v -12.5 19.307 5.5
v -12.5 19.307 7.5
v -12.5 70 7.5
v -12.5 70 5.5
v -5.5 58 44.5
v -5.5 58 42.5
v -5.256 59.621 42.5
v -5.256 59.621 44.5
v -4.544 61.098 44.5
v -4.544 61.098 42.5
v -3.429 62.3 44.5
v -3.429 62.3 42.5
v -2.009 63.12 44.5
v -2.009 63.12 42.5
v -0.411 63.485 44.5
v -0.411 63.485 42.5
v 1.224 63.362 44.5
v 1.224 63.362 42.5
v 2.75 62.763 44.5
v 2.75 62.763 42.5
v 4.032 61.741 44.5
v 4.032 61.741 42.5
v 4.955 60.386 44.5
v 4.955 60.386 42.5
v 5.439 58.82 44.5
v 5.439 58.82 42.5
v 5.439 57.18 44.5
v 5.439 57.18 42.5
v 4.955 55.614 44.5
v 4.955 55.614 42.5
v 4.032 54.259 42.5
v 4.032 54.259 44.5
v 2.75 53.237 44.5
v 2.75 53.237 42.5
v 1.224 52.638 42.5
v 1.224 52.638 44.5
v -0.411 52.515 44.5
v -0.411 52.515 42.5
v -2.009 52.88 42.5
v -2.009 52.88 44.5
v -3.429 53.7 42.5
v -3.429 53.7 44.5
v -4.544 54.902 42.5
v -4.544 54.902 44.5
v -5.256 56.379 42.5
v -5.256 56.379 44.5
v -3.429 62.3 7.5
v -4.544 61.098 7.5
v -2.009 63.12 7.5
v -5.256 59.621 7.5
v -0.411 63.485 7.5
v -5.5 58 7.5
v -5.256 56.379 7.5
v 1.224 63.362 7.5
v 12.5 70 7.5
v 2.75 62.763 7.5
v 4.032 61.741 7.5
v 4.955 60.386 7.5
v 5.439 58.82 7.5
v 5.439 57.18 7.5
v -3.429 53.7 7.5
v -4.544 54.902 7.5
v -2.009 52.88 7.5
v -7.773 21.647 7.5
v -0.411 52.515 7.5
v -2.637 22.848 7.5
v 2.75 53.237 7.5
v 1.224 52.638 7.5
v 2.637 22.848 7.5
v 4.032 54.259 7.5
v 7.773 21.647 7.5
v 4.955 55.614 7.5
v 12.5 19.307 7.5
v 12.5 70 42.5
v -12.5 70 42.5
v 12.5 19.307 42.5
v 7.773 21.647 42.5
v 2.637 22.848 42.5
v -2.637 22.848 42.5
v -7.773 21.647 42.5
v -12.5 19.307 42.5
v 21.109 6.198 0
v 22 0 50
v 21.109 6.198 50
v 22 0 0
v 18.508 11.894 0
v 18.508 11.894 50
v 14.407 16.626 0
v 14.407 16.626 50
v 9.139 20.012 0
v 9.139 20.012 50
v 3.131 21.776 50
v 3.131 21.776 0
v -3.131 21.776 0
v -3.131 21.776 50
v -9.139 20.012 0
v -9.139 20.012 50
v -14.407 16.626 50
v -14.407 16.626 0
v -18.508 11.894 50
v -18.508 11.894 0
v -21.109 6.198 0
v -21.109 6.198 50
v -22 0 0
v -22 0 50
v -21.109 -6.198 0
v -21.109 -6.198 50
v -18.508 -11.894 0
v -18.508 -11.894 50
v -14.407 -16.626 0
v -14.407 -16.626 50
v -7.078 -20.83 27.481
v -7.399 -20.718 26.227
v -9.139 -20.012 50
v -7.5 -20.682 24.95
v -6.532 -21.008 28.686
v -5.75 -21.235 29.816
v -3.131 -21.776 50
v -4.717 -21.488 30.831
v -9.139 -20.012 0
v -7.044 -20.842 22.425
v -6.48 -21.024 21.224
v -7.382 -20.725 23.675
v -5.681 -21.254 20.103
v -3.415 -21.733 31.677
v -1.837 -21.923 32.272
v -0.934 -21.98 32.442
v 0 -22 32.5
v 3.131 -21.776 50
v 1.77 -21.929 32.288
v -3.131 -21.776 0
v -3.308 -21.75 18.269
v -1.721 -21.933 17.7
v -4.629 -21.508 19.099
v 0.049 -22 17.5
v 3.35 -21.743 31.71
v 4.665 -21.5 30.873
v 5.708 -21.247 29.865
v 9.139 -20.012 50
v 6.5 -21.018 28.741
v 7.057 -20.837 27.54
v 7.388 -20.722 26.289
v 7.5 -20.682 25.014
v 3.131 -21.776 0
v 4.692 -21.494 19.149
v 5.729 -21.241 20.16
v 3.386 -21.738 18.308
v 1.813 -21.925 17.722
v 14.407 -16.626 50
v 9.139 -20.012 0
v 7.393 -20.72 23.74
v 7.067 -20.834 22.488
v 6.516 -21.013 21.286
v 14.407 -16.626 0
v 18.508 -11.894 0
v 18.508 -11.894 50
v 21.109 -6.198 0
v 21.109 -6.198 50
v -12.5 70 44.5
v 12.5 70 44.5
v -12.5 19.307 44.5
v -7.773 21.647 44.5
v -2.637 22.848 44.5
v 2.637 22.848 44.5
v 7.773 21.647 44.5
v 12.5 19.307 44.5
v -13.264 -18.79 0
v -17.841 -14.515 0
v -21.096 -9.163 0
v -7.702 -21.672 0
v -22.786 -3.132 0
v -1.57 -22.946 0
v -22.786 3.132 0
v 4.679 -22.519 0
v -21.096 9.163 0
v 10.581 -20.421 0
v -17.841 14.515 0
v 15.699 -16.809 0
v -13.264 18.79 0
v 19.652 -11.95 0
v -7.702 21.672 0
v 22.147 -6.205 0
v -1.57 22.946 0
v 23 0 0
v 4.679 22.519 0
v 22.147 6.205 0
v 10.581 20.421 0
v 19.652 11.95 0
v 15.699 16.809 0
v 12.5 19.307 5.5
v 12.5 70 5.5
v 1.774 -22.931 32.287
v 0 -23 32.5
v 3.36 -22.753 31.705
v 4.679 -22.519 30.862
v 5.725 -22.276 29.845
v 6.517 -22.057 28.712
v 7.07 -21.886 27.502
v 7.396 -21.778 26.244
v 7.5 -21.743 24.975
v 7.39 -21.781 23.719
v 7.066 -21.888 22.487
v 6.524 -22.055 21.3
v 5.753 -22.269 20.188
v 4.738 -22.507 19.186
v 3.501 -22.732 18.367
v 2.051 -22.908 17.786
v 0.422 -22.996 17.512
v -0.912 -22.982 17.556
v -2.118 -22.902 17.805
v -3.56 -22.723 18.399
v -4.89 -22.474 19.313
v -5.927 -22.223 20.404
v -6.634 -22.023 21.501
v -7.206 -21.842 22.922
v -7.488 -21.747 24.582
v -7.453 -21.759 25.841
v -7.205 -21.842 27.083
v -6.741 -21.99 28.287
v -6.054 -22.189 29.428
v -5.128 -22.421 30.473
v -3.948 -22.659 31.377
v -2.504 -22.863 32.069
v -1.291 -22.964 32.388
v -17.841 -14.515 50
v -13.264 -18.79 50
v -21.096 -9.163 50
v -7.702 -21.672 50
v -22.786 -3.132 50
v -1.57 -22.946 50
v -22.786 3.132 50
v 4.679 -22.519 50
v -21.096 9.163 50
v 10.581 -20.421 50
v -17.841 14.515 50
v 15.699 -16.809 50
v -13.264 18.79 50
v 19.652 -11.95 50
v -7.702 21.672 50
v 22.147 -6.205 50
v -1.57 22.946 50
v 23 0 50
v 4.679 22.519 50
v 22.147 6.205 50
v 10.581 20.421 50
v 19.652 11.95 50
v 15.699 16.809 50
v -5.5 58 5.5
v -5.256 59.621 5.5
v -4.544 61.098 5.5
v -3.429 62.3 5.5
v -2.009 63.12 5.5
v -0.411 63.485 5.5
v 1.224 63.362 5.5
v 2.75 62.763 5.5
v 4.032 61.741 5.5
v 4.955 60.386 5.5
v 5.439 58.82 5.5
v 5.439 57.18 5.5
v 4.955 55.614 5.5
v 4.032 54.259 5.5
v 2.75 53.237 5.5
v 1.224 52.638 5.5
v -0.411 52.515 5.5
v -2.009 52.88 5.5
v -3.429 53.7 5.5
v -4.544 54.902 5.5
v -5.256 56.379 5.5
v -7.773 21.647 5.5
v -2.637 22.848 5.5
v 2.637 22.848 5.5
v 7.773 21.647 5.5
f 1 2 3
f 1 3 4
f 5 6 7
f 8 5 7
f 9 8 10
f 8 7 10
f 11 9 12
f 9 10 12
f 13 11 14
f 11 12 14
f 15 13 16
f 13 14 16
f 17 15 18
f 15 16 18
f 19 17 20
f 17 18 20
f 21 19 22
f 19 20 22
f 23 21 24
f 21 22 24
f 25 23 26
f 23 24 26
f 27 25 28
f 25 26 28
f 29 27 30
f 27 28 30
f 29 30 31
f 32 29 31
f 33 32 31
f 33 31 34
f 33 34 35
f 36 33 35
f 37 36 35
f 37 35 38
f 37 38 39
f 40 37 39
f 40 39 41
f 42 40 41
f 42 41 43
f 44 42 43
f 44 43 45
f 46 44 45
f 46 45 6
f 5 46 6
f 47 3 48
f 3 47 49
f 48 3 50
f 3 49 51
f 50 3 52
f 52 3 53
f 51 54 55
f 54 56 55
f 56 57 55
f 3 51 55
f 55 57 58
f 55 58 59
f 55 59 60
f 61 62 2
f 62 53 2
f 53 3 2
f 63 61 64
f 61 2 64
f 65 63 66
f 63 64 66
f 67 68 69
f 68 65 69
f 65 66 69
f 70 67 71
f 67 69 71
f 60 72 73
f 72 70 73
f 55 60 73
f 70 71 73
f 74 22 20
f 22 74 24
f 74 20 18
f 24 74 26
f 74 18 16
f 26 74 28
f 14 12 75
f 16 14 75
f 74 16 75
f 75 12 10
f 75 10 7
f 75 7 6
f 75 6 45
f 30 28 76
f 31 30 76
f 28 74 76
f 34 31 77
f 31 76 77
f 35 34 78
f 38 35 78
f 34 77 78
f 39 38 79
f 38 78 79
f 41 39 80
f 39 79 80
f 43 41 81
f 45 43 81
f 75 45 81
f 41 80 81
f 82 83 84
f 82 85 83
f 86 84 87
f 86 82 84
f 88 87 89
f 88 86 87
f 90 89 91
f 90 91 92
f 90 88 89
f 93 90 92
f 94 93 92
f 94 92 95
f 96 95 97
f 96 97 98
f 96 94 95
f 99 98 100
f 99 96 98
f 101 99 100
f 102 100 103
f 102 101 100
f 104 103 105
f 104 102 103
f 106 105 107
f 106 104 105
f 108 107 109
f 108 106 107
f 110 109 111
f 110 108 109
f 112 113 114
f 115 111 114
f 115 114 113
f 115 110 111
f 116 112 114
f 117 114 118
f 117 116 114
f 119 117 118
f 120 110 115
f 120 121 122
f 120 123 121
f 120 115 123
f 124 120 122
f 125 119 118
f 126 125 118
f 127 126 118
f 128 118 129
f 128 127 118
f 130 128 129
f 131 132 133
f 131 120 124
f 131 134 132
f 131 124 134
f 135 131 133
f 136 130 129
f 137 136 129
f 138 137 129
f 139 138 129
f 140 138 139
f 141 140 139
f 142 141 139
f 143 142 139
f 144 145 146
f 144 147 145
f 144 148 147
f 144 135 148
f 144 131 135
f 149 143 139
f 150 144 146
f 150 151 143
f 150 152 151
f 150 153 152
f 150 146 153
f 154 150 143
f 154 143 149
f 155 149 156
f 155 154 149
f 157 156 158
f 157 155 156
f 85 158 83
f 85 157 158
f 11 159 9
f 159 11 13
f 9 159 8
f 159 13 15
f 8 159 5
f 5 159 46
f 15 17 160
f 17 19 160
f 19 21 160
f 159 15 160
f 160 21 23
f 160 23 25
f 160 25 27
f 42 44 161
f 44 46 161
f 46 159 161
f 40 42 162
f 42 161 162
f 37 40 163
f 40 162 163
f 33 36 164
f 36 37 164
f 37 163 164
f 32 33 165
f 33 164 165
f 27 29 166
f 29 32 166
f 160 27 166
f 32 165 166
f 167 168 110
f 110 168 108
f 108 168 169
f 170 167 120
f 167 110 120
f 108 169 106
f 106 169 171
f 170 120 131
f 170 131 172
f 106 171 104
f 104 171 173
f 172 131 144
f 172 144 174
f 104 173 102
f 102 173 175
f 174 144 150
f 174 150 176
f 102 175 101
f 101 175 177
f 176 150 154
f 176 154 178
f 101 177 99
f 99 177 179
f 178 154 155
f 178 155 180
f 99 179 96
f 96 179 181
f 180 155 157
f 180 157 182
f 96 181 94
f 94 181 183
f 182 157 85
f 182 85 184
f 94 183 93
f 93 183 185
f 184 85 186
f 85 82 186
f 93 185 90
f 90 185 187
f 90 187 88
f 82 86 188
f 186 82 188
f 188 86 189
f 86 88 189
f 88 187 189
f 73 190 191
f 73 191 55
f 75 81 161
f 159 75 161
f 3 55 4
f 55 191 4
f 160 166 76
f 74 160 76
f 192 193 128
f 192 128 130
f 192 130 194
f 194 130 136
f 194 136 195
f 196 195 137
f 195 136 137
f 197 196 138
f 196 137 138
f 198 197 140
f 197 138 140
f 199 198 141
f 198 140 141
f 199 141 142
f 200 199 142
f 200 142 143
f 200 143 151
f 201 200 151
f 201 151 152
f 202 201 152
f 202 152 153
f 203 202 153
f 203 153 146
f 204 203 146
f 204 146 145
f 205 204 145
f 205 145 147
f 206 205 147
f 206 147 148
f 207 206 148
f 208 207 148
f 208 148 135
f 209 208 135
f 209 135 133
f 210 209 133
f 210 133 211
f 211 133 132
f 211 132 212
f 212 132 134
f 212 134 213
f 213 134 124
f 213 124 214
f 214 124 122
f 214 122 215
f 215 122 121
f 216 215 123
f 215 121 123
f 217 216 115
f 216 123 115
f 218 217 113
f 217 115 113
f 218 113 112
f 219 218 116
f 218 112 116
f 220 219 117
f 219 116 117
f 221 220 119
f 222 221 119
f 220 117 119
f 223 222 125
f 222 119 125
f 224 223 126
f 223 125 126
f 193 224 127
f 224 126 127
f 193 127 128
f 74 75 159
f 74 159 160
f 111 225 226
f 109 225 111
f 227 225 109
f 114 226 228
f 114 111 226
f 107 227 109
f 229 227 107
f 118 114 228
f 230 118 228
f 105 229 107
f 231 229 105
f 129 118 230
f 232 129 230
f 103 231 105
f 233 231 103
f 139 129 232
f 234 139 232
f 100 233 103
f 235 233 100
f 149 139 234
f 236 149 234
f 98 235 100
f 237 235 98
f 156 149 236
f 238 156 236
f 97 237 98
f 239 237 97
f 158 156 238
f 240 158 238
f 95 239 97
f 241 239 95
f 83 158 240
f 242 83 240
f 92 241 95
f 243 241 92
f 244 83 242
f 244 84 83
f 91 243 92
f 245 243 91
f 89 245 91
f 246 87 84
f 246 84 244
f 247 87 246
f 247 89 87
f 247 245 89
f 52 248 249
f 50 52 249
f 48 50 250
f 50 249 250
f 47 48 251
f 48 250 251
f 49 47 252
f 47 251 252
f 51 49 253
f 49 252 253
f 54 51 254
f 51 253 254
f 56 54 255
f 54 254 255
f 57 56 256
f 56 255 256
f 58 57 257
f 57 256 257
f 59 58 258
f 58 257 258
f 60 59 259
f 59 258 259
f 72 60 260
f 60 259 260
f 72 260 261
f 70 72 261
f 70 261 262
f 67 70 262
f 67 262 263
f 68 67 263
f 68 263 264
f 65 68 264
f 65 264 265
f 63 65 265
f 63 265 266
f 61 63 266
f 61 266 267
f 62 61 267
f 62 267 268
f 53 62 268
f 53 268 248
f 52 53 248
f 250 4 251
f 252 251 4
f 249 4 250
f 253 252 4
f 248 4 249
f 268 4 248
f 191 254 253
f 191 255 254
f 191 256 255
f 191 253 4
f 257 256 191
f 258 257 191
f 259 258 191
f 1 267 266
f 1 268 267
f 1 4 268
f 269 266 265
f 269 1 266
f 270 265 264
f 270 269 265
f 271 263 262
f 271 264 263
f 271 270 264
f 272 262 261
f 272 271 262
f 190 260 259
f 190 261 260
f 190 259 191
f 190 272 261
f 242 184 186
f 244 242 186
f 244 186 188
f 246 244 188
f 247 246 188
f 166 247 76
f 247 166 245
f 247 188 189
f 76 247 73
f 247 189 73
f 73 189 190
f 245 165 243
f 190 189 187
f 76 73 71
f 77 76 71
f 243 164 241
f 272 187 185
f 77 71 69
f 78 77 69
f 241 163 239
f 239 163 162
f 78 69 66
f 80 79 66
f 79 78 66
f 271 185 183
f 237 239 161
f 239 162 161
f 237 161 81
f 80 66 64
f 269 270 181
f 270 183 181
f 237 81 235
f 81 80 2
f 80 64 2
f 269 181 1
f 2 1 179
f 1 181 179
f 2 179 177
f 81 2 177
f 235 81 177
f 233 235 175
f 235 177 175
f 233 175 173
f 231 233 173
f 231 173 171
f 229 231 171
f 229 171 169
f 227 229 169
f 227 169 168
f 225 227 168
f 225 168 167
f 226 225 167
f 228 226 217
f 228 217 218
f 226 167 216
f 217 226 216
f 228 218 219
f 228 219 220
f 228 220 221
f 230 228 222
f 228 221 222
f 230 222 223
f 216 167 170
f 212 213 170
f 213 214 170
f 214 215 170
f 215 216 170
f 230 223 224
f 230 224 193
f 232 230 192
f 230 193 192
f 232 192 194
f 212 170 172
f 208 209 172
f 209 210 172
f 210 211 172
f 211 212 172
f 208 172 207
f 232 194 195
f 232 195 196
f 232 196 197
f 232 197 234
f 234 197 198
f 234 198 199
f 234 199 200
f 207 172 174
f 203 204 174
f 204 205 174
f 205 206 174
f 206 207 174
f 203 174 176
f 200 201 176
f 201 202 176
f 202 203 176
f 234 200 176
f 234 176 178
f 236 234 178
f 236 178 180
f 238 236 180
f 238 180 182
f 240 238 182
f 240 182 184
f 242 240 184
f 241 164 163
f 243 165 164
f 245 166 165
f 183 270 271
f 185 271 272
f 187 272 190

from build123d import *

# Parameters (mm, degrees)
ESBO_O1_R                = 23
ESBO_O1_R_2              = 22
RESSALTO_EXTRUS_O1_DEPTH = 50
ESBO_O2_R                = 7.5
CORTE_EXTRUS_O1_DEPTH    = 50
RESSALTO_EXTRUS_O2_DEPTH = 70
ESBO_O4_R                = 22
CORTE_EXTRUS_O2_DEPTH    = 70
ESBO_O7_R                = 5.5
CORTE_EXTRUS_O4_DEPTH    = 70


with BuildPart() as part:
    # Esboço1 → Ressalto-extrusão1 (new body)
    with BuildSketch(Plane.XY):
        Circle(ESBO_O1_R)
        Circle(ESBO_O1_R_2, mode=Mode.SUBTRACT)
    extrude(amount=RESSALTO_EXTRUS_O1_DEPTH)

    # Esboço2 → Corte-extrusão1 (cut)
    with BuildSketch(Plane(origin=(0, 0, 0), x_dir=(1, 0, 0), z_dir=(0, 1, 0))):
        with Locations(Location((0, -25, 0), (0, 0, 270))):
            Circle(ESBO_O2_R)
    extrude(amount=-CORTE_EXTRUS_O1_DEPTH, mode=Mode.SUBTRACT)

    # Esboço3 → Ressalto-extrusão2 (add)
    with BuildSketch(Plane(origin=(0, 0, 0), x_dir=(1, 0, 0), z_dir=(0, 1, 0))):
        Polygon((0, -7.5), (-12.5, -7.5), (-12.5, -5.5), (12.5, -5.5), (12.5, -7.5), align=None)
        Polygon((0, -42.5), (-12.5, -42.5), (-12.5, -44.5), (12.5, -44.5), (12.5, -42.5), align=None)
    extrude(amount=RESSALTO_EXTRUS_O2_DEPTH)

    # Esboço4 → Corte-extrusão2 (cut)
    with BuildSketch(Plane(origin=(0, 0, 5.5), x_dir=(-1, 0, 0), z_dir=(0, 0, -1))):
        with Locations(Location((0, 0, 0), (0, 0, 180))):
            Circle(ESBO_O4_R)
    extrude(amount=-CORTE_EXTRUS_O2_DEPTH, mode=Mode.SUBTRACT)

    # Esboço7 → Corte-extrusão4 (cut)
    with BuildSketch(Plane(origin=(0, 0, 5.5), x_dir=(-1, 0, 0), z_dir=(0, 0, -1))):
        with Locations((0, 58)):
            Circle(ESBO_O7_R)
    extrude(amount=-CORTE_EXTRUS_O4_DEPTH, mode=Mode.SUBTRACT)


solid = part.part
